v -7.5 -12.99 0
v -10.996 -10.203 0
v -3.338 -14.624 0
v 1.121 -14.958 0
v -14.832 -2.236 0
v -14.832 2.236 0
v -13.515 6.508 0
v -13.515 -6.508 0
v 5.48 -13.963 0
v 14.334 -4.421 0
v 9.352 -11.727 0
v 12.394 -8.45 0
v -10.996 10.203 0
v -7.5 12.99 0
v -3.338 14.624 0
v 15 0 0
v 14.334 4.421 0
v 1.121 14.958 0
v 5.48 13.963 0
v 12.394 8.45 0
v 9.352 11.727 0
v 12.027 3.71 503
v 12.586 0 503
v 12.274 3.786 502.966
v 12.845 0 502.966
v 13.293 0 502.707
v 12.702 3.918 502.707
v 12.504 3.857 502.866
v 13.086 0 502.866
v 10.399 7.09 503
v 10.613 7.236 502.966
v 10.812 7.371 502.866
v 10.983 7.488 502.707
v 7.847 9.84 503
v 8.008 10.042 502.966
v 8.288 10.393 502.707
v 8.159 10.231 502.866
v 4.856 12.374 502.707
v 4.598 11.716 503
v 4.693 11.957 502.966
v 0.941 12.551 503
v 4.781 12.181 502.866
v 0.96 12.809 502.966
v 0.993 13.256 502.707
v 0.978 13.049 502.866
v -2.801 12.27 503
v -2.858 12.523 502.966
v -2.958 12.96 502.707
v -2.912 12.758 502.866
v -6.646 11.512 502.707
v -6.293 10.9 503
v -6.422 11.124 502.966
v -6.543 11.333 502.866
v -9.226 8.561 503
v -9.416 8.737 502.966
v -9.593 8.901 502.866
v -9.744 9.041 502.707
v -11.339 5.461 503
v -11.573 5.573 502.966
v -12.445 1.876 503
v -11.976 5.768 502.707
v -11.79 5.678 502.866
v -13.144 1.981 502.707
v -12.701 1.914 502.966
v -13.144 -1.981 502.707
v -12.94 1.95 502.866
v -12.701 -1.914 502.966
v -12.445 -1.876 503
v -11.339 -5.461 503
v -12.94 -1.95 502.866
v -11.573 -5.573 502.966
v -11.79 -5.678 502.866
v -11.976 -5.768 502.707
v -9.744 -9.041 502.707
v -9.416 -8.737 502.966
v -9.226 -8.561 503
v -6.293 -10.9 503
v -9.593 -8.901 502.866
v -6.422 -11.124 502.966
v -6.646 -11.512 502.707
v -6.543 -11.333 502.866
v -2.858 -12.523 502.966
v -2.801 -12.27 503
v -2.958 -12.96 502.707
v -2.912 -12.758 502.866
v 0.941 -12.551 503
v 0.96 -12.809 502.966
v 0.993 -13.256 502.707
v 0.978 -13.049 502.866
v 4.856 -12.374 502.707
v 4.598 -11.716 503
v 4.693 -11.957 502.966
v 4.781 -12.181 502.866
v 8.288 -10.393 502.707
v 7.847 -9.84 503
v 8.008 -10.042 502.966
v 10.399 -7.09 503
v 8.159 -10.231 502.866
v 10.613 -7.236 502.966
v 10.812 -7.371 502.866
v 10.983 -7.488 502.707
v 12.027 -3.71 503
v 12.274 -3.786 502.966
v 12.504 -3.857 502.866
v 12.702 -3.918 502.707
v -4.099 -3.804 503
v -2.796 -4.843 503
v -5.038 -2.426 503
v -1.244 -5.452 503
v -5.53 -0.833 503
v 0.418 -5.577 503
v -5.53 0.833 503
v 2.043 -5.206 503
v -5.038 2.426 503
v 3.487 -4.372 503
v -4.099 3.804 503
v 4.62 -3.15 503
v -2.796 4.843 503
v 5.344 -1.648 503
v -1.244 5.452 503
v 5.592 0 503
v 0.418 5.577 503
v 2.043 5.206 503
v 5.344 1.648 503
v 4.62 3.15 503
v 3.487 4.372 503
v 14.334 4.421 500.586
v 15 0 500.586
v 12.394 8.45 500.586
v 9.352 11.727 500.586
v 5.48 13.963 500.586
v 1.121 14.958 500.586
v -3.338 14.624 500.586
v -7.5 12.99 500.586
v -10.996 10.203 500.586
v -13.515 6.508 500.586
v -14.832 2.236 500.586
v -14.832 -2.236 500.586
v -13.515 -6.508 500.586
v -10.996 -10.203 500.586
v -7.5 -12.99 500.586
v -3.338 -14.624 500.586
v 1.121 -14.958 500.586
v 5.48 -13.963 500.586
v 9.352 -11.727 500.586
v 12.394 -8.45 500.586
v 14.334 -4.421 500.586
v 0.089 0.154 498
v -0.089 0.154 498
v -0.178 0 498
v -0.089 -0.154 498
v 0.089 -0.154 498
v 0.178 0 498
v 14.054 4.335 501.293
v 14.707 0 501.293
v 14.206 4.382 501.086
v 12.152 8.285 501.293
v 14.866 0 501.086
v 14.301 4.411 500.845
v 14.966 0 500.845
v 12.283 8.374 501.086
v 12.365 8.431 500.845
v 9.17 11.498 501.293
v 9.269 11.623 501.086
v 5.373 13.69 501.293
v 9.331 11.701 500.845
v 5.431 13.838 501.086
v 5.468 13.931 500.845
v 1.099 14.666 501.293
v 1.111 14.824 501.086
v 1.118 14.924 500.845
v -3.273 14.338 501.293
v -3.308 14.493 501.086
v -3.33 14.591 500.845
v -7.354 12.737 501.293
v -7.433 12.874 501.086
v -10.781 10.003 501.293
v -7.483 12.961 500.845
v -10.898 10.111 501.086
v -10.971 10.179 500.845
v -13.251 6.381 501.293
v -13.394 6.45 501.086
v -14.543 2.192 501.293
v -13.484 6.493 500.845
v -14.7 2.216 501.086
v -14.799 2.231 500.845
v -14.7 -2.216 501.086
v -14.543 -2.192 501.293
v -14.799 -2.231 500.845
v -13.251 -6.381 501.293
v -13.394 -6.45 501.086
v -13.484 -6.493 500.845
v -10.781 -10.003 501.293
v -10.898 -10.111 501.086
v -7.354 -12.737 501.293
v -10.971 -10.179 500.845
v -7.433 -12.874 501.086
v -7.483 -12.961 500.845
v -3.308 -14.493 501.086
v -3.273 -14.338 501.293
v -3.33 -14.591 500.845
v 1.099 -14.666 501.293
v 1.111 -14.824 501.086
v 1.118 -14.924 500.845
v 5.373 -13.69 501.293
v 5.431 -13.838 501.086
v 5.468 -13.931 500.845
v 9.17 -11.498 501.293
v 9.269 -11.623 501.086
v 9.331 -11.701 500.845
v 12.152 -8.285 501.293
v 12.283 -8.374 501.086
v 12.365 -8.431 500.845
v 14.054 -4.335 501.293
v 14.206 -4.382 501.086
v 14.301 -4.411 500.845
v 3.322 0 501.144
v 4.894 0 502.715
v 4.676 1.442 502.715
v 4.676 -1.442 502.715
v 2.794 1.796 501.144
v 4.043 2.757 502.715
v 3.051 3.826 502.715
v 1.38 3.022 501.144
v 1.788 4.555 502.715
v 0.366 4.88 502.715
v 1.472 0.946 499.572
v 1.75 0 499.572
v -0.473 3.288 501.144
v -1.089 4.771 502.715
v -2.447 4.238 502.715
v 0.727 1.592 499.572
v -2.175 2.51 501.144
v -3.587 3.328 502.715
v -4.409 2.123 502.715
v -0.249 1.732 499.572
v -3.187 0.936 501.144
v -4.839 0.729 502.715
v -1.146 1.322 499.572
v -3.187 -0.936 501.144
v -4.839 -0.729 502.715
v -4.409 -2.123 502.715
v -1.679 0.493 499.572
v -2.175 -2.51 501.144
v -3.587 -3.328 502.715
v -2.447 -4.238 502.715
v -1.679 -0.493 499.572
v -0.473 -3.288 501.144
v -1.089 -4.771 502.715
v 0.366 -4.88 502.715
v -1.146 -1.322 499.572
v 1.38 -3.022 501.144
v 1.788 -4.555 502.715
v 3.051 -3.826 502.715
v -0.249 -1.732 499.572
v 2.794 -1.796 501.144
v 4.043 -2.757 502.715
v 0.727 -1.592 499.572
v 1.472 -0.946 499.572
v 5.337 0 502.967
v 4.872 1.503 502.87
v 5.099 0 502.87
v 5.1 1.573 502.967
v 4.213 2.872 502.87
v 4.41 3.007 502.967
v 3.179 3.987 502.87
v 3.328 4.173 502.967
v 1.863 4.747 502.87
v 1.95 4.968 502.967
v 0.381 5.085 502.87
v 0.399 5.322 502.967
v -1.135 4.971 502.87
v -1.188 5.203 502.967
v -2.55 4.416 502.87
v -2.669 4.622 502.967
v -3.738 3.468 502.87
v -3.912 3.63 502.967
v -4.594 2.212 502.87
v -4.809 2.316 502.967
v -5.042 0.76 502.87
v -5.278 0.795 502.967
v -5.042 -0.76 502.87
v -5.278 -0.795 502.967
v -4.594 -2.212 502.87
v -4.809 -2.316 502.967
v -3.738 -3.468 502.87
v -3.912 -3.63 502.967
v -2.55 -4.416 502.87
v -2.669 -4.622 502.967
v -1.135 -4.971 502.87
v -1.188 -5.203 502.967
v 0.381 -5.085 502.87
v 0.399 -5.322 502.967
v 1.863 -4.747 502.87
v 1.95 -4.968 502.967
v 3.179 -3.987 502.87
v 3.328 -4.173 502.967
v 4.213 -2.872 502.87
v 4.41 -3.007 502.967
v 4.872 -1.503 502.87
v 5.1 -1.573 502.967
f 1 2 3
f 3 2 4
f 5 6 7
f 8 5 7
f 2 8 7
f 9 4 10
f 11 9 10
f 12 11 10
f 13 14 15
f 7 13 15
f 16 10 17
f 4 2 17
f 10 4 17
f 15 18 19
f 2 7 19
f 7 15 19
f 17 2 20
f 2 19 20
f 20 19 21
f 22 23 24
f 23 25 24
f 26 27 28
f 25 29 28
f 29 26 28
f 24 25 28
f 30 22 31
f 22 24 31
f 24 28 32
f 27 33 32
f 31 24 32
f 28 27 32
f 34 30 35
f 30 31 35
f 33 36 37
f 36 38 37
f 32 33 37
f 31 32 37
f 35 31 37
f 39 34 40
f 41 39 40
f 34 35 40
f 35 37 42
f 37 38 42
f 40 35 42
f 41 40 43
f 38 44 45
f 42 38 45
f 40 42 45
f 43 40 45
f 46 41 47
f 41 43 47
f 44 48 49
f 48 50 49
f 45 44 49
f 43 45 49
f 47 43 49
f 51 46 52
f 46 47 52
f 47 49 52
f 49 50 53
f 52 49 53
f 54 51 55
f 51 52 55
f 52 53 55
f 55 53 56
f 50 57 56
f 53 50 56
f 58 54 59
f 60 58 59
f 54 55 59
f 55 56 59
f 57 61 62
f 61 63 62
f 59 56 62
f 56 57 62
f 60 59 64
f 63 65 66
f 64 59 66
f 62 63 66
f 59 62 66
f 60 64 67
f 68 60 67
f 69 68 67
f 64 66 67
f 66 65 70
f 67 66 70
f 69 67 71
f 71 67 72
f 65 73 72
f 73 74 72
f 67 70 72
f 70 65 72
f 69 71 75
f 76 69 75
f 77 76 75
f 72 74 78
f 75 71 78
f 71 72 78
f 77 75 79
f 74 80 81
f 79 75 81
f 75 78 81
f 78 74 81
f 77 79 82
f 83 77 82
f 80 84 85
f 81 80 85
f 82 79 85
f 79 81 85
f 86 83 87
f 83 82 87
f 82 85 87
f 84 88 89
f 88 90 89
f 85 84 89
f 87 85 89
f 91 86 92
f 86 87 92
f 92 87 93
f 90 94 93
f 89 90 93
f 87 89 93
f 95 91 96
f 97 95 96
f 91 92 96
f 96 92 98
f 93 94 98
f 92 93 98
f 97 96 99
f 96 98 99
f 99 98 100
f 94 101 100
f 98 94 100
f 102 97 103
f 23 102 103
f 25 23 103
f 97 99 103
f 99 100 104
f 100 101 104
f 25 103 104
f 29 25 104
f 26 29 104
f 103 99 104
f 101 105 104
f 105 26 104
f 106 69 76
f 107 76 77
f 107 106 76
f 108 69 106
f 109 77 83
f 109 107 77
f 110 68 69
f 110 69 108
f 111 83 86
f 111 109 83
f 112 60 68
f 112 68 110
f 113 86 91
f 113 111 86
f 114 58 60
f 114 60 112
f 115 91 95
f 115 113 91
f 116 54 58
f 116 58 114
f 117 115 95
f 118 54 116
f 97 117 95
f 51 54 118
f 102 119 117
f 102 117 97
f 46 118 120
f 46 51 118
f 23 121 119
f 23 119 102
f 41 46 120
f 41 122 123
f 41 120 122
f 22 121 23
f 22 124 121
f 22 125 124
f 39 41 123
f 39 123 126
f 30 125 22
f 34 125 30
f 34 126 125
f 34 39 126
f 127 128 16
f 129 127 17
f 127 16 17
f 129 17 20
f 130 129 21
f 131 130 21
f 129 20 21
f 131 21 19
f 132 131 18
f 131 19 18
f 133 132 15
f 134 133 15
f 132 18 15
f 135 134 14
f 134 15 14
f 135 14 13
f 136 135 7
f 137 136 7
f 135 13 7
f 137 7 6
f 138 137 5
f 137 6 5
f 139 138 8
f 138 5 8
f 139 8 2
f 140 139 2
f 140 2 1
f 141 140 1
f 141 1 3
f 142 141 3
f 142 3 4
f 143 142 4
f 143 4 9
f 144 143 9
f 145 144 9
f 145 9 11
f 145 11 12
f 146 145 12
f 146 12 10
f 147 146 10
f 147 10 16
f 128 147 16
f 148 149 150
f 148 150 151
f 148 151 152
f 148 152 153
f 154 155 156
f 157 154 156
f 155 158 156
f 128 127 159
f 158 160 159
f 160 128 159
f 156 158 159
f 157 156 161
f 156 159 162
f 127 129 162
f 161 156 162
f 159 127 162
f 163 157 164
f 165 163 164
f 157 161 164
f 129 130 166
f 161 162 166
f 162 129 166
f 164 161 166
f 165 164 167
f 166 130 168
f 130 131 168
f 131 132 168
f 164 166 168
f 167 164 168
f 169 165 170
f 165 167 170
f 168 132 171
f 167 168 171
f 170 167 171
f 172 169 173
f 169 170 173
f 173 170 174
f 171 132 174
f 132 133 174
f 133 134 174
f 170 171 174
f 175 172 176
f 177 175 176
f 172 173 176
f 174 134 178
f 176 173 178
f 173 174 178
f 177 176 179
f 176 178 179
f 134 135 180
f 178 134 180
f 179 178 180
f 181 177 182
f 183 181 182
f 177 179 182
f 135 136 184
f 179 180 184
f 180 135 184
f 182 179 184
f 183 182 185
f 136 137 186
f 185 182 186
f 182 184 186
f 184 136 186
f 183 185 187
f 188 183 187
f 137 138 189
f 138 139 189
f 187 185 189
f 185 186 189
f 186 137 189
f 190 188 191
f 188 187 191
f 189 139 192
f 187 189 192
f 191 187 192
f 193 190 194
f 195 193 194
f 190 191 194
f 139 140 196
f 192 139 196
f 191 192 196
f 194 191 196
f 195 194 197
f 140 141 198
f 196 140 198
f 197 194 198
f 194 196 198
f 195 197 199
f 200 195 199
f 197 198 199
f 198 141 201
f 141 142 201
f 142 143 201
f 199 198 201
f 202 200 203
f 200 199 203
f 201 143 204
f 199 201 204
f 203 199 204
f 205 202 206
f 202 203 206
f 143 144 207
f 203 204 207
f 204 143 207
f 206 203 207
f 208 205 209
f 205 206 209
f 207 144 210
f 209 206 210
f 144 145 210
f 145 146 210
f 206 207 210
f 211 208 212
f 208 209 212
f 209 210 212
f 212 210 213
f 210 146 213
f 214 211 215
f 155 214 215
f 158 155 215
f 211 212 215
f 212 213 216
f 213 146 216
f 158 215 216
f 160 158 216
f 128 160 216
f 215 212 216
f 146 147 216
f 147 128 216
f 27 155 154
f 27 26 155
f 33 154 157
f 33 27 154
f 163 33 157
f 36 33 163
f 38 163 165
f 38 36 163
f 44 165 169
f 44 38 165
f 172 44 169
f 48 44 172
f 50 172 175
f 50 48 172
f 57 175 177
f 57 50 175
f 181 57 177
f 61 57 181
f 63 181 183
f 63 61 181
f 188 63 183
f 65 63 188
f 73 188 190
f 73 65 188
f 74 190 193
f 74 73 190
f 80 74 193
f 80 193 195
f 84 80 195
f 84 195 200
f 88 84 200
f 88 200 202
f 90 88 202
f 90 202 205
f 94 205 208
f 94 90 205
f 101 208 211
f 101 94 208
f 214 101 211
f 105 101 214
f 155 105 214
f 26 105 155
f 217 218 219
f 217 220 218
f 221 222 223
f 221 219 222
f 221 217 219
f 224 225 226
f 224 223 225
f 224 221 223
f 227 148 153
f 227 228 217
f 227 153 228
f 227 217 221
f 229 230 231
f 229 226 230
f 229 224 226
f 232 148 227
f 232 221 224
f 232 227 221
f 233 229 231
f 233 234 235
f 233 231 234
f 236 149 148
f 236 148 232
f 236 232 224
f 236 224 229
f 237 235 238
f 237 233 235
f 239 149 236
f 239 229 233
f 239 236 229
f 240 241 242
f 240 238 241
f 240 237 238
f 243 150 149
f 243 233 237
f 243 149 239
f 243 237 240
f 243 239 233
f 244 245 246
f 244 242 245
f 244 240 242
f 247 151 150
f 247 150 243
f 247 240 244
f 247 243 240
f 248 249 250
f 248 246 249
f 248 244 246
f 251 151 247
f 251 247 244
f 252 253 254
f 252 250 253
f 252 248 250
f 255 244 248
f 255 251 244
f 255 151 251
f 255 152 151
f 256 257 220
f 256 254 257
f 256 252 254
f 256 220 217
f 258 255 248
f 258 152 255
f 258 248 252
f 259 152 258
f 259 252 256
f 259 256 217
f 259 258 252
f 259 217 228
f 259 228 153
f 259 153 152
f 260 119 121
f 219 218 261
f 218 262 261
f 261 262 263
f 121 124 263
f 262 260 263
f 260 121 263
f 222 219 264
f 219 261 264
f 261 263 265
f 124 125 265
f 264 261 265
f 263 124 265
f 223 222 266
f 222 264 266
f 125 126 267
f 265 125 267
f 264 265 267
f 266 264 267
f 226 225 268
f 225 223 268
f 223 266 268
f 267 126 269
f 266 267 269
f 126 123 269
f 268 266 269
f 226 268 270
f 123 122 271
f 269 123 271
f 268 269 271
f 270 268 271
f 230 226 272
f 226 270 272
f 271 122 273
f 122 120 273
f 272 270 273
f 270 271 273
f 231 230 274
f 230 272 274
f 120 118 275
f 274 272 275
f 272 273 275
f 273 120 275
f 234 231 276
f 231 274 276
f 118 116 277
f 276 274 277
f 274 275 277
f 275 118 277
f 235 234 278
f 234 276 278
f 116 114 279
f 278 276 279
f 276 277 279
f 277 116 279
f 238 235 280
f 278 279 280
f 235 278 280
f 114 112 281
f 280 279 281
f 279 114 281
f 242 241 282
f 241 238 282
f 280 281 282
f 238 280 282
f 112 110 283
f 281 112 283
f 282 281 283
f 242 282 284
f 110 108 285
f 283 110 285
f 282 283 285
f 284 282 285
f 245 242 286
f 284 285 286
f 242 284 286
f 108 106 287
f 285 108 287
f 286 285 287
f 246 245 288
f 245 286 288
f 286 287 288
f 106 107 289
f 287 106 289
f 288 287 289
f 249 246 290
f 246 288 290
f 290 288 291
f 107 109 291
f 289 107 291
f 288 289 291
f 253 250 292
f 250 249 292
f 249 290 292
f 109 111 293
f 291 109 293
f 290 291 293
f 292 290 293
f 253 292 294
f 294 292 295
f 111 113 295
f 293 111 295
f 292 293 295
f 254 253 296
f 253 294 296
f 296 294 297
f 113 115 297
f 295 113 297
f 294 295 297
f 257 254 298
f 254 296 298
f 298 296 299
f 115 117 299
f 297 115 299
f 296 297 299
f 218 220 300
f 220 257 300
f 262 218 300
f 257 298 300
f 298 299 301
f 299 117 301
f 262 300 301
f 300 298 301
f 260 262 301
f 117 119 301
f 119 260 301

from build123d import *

# Parameters (mm, degrees)
SKETCH1_R           = 15
BOSS_EXTRUDE1_DEPTH = 503
CHAMFER1_SIZE       = 2
SKETCH2_R           = 5.177936305
CUT_EXTRUDE1_DEPTH  = 5
CHAMFER2_SIZE       = 5


with BuildPart() as part:
    # Sketch1 → Boss-Extrude1 (new body)
    with BuildSketch(Plane.XY):
        Circle(SKETCH1_R)
    extrude(amount=BOSS_EXTRUDE1_DEPTH)

    # Chamfer1
    chamfer1_edges = [part.edges().sort_by_distance(p)[0] for p in [
        (-15, 0, 503),
    ]]
    chamfer(chamfer1_edges, length=CHAMFER1_SIZE)

    # Sketch2 → Cut-Extrude1 (cut)
    with BuildSketch(Plane.XY.offset(503)):
        Circle(SKETCH2_R)
    extrude(amount=-CUT_EXTRUDE1_DEPTH, mode=Mode.SUBTRACT)

    # Chamfer2
    chamfer2_edges = [part.edges().sort_by_distance(p)[0] for p in [
        (-5.177936305, 0, 498),
    ]]
    chamfer(chamfer2_edges, length=CHAMFER2_SIZE - 0.0001)  # a hair under: the kernel refuses the full size

    # Fillet1: read off the stored shape, not the designer's step
    # Fillet1 outline → Fillet1 (revolve, cut)
    with BuildSketch(Plane.XZ):
        with BuildLine():
            ThreePointArc((14.707106781, 501.292893219), (14.923879533, 500.96846987), (15, 500.585786438))
            Line((15, 500.585786438), (15, 501.292893219))
            Line((15, 501.292893219), (14.707106781, 501.292893219))
        make_face()
        with BuildLine():
            ThreePointArc((12.585786438, 503), (12.96846987, 502.923879533), (13.292893219, 502.707106781))
            Line((13.292893219, 502.707106781), (13.292893219, 503))
            Line((13.292893219, 503), (12.585786438, 503))
        make_face()
        with BuildLine():
            ThreePointArc((4.885043086, 502.707106781), (5.209466435, 502.923879533), (5.592149867, 503))
            Line((5.592149867, 503), (4.885043086, 503))
            Line((4.885043086, 503), (4.885043086, 502.707106781))
        make_face()
    revolve(axis=Axis((0, 0, 0), (0, 0, 1)), mode=Mode.SUBTRACT)


solid = part.part
